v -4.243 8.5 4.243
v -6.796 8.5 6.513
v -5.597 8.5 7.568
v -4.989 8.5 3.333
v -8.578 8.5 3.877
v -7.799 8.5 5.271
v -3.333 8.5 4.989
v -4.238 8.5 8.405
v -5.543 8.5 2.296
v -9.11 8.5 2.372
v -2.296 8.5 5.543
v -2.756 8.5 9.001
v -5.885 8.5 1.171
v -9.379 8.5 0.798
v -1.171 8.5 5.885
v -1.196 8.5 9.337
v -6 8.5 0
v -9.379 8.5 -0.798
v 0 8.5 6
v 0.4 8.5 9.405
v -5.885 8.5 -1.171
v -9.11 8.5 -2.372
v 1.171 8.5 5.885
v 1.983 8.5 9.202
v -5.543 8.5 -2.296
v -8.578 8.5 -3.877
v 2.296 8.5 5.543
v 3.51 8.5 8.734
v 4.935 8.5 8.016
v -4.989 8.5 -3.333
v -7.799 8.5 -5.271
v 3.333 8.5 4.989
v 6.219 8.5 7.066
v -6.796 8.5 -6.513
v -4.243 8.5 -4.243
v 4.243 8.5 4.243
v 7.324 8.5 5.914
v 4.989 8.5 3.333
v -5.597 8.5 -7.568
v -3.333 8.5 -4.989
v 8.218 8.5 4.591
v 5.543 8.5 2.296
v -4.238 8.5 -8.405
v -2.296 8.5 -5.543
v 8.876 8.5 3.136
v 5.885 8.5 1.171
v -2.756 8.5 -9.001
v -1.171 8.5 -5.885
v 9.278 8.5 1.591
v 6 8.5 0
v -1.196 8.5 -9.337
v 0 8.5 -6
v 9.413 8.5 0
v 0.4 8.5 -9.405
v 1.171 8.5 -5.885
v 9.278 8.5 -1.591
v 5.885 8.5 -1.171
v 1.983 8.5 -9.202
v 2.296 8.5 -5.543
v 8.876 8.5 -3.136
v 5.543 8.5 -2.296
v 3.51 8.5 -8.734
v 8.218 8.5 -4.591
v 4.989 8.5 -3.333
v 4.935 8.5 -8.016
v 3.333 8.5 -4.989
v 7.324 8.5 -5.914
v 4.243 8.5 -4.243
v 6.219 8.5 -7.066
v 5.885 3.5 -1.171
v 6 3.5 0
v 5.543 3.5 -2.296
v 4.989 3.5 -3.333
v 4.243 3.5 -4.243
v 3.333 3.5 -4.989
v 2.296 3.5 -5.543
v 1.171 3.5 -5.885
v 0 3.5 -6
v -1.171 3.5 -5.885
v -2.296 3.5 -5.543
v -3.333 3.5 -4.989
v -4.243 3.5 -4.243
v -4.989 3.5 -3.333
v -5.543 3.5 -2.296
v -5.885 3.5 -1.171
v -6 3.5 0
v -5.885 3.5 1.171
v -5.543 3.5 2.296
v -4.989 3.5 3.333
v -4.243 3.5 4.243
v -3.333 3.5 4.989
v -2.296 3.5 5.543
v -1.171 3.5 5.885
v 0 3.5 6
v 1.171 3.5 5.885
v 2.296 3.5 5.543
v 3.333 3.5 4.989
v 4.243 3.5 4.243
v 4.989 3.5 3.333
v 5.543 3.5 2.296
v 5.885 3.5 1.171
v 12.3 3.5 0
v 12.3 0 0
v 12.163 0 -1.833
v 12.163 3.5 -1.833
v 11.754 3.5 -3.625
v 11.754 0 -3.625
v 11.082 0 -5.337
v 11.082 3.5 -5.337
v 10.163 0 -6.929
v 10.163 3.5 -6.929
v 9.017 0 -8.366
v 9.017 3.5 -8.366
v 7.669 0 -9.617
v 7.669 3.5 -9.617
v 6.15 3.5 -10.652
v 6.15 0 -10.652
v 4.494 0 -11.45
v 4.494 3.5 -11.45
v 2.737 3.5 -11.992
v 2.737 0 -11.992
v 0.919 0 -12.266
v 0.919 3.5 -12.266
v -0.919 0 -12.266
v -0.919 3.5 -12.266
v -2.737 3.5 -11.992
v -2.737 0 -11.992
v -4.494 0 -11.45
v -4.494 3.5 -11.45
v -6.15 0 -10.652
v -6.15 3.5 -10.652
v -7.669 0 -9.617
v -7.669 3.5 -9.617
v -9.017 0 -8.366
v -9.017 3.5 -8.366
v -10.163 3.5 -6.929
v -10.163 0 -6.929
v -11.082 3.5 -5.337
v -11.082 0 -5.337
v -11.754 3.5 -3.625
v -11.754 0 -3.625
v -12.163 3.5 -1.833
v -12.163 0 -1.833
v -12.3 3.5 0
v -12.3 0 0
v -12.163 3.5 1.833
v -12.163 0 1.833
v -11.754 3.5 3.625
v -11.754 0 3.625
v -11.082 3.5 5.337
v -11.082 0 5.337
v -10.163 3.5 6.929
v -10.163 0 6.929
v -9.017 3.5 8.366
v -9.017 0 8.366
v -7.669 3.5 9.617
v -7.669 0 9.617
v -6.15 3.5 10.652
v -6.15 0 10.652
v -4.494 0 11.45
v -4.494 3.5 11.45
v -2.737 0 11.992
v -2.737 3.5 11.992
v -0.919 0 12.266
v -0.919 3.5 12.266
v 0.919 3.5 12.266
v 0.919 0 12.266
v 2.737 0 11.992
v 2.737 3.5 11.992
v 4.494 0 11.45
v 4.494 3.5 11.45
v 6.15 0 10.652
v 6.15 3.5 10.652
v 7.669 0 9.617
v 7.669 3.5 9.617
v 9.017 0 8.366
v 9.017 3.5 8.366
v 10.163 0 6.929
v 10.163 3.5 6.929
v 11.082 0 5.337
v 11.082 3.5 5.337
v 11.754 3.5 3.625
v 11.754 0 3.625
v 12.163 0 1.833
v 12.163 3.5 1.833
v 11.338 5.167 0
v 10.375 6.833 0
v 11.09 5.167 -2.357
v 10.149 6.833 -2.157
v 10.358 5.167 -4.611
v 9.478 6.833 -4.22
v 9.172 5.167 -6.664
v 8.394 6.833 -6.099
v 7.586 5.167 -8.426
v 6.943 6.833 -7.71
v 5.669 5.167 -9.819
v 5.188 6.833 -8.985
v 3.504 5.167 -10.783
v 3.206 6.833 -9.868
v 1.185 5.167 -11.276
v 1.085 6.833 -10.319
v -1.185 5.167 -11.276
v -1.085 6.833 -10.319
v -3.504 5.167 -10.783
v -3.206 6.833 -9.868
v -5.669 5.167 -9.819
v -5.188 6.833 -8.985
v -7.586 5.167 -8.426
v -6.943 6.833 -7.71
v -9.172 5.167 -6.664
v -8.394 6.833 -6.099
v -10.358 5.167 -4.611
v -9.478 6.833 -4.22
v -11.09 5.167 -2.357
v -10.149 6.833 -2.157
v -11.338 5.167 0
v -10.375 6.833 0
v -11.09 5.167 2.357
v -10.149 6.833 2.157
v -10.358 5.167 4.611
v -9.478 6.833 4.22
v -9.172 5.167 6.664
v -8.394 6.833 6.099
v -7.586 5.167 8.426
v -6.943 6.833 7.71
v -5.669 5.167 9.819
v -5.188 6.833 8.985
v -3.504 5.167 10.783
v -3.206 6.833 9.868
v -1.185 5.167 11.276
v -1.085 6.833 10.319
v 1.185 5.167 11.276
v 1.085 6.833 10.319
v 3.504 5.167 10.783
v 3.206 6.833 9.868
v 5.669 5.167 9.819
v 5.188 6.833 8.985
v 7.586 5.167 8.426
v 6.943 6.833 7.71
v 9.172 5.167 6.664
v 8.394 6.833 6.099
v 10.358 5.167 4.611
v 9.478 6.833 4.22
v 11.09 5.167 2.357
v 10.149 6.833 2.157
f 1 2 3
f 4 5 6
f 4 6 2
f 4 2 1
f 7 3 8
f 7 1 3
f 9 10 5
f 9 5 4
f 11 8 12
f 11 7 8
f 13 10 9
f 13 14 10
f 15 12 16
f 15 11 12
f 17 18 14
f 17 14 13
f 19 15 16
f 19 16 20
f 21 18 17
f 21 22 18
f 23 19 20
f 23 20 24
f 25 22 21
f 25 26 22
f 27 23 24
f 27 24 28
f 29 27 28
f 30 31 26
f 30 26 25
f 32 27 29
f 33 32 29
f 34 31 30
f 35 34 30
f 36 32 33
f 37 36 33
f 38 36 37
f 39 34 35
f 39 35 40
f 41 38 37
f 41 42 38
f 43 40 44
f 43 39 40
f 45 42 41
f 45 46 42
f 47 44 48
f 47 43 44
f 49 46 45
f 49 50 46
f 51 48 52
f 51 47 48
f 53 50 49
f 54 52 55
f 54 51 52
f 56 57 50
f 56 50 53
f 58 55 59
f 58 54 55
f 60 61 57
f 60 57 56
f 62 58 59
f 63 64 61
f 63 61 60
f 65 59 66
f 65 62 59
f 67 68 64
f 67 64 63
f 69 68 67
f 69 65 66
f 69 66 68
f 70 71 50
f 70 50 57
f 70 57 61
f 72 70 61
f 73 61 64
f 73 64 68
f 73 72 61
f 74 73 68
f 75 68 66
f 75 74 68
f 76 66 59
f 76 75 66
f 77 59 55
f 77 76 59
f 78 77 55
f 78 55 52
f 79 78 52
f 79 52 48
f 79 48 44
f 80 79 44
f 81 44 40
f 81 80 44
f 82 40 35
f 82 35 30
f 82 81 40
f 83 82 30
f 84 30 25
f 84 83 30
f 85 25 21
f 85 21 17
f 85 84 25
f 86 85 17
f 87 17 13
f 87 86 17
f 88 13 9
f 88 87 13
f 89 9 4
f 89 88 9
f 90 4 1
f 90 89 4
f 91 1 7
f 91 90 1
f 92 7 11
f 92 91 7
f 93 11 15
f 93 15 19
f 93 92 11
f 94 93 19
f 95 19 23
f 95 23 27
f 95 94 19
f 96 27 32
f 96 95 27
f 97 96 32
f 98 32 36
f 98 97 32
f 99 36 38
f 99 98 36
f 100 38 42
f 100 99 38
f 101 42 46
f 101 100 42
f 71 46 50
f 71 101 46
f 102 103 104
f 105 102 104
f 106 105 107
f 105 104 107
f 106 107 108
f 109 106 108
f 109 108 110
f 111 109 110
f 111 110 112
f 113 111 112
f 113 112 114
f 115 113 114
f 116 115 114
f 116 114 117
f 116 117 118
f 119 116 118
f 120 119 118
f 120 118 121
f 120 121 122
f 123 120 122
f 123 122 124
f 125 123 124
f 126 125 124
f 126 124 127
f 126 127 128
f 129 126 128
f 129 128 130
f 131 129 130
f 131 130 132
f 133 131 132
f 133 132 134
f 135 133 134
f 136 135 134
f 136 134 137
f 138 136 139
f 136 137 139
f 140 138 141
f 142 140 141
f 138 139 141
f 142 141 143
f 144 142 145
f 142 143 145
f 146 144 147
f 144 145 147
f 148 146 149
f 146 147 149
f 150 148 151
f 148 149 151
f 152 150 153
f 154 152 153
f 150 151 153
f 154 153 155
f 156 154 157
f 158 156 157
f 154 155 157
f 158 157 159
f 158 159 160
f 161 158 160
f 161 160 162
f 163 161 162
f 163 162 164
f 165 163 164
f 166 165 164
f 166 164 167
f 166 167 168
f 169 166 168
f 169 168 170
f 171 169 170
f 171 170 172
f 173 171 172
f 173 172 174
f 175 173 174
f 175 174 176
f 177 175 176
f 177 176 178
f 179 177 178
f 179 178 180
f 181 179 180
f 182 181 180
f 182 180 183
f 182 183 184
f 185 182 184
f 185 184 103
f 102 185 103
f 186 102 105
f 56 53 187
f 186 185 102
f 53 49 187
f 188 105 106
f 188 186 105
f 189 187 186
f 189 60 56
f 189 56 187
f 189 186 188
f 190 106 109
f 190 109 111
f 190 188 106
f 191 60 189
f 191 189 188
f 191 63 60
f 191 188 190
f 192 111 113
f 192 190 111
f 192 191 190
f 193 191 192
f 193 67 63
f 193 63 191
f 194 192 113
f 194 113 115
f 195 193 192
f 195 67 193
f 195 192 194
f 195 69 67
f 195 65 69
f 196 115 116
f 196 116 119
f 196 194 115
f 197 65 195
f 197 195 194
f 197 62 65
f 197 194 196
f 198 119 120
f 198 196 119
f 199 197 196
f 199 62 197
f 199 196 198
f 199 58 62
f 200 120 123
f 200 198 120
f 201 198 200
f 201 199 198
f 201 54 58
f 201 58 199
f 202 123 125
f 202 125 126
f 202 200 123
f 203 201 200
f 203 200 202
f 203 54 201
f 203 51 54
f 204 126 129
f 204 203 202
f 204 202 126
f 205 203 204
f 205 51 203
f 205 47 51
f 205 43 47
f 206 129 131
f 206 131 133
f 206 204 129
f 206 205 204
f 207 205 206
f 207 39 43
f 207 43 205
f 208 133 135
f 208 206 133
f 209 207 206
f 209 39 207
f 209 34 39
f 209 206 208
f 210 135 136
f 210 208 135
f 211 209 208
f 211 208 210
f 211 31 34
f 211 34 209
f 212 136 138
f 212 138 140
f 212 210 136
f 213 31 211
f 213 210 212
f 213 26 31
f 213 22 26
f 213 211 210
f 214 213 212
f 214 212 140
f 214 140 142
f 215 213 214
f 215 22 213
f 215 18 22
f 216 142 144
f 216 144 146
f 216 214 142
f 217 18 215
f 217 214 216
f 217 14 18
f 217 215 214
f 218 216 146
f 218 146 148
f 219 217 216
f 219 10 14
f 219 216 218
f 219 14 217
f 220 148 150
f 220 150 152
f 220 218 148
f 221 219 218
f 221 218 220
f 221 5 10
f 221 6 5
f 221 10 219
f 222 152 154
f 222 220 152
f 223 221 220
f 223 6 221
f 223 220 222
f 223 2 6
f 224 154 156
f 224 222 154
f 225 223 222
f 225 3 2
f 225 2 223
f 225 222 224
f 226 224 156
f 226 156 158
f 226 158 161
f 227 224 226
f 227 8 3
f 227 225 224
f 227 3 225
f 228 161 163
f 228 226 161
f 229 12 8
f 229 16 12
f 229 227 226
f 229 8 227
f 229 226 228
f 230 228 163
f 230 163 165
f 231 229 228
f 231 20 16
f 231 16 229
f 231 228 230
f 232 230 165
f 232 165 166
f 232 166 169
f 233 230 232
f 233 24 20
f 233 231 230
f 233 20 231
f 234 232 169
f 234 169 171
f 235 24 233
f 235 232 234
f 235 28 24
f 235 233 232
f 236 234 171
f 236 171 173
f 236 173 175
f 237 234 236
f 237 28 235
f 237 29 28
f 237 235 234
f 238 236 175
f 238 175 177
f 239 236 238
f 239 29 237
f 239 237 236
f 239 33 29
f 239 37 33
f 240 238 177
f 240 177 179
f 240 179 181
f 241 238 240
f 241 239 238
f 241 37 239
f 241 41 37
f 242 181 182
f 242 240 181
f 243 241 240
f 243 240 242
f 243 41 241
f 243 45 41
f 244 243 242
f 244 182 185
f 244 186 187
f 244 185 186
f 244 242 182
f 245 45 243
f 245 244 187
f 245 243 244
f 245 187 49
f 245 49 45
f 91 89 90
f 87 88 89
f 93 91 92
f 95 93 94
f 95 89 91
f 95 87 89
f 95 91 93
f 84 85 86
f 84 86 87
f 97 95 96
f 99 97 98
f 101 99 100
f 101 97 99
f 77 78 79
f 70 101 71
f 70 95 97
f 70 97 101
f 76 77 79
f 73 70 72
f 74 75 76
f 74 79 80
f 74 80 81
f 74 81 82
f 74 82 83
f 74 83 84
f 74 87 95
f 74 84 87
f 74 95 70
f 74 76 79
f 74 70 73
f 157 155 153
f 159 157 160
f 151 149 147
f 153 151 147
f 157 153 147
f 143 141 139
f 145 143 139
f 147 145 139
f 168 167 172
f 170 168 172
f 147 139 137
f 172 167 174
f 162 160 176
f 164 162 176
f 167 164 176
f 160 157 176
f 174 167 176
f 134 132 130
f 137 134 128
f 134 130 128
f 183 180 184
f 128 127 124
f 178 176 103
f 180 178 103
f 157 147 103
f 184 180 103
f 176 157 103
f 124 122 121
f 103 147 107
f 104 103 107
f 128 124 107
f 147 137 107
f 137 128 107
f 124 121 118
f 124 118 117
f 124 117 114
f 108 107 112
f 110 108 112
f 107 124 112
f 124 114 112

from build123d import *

# Parameters (mm, degrees)
SKETCH1_R           = 12.3
BOSS_EXTRUDE1_DEPTH = 3.5
SKETCH2_R           = 12.3
SKETCH2_R_2         = 6
BOSS_EXTRUDE2_DEPTH = 5
CHAMFER1_SIZE       = 5
CHAMFER1_SIZE2      = 2.886751346


with BuildPart() as part:
    # Sketch1 → Boss-Extrude1 (new body)
    with BuildSketch(Plane(origin=(0, 0, 0), x_dir=(1, 0, 0), z_dir=(0, 1, 0))):
        Circle(SKETCH1_R)
    extrude(amount=BOSS_EXTRUDE1_DEPTH)

    # Sketch2 → Boss-Extrude2 (add)
    with BuildSketch(Plane(origin=(0, 3.5, 0), x_dir=(1, 0, 0), z_dir=(0, 1, 0))):
        Circle(SKETCH2_R)
        Circle(SKETCH2_R_2, mode=Mode.SUBTRACT)
    extrude(amount=BOSS_EXTRUDE2_DEPTH)

    # Chamfer1
    chamfer1_edges = [part.edges().sort_by_distance(p)[0] for p in [
        (-12.3, 8.5, 0),
    ]]
    chamfer1_side = [part.faces().sort_by_distance(p)[0] for p in [
        (-12.3, 4.25, 0),
    ]]
    chamfer(chamfer1_edges, length=CHAMFER1_SIZE, length2=CHAMFER1_SIZE2, reference=chamfer1_side[0])


solid = part.part
